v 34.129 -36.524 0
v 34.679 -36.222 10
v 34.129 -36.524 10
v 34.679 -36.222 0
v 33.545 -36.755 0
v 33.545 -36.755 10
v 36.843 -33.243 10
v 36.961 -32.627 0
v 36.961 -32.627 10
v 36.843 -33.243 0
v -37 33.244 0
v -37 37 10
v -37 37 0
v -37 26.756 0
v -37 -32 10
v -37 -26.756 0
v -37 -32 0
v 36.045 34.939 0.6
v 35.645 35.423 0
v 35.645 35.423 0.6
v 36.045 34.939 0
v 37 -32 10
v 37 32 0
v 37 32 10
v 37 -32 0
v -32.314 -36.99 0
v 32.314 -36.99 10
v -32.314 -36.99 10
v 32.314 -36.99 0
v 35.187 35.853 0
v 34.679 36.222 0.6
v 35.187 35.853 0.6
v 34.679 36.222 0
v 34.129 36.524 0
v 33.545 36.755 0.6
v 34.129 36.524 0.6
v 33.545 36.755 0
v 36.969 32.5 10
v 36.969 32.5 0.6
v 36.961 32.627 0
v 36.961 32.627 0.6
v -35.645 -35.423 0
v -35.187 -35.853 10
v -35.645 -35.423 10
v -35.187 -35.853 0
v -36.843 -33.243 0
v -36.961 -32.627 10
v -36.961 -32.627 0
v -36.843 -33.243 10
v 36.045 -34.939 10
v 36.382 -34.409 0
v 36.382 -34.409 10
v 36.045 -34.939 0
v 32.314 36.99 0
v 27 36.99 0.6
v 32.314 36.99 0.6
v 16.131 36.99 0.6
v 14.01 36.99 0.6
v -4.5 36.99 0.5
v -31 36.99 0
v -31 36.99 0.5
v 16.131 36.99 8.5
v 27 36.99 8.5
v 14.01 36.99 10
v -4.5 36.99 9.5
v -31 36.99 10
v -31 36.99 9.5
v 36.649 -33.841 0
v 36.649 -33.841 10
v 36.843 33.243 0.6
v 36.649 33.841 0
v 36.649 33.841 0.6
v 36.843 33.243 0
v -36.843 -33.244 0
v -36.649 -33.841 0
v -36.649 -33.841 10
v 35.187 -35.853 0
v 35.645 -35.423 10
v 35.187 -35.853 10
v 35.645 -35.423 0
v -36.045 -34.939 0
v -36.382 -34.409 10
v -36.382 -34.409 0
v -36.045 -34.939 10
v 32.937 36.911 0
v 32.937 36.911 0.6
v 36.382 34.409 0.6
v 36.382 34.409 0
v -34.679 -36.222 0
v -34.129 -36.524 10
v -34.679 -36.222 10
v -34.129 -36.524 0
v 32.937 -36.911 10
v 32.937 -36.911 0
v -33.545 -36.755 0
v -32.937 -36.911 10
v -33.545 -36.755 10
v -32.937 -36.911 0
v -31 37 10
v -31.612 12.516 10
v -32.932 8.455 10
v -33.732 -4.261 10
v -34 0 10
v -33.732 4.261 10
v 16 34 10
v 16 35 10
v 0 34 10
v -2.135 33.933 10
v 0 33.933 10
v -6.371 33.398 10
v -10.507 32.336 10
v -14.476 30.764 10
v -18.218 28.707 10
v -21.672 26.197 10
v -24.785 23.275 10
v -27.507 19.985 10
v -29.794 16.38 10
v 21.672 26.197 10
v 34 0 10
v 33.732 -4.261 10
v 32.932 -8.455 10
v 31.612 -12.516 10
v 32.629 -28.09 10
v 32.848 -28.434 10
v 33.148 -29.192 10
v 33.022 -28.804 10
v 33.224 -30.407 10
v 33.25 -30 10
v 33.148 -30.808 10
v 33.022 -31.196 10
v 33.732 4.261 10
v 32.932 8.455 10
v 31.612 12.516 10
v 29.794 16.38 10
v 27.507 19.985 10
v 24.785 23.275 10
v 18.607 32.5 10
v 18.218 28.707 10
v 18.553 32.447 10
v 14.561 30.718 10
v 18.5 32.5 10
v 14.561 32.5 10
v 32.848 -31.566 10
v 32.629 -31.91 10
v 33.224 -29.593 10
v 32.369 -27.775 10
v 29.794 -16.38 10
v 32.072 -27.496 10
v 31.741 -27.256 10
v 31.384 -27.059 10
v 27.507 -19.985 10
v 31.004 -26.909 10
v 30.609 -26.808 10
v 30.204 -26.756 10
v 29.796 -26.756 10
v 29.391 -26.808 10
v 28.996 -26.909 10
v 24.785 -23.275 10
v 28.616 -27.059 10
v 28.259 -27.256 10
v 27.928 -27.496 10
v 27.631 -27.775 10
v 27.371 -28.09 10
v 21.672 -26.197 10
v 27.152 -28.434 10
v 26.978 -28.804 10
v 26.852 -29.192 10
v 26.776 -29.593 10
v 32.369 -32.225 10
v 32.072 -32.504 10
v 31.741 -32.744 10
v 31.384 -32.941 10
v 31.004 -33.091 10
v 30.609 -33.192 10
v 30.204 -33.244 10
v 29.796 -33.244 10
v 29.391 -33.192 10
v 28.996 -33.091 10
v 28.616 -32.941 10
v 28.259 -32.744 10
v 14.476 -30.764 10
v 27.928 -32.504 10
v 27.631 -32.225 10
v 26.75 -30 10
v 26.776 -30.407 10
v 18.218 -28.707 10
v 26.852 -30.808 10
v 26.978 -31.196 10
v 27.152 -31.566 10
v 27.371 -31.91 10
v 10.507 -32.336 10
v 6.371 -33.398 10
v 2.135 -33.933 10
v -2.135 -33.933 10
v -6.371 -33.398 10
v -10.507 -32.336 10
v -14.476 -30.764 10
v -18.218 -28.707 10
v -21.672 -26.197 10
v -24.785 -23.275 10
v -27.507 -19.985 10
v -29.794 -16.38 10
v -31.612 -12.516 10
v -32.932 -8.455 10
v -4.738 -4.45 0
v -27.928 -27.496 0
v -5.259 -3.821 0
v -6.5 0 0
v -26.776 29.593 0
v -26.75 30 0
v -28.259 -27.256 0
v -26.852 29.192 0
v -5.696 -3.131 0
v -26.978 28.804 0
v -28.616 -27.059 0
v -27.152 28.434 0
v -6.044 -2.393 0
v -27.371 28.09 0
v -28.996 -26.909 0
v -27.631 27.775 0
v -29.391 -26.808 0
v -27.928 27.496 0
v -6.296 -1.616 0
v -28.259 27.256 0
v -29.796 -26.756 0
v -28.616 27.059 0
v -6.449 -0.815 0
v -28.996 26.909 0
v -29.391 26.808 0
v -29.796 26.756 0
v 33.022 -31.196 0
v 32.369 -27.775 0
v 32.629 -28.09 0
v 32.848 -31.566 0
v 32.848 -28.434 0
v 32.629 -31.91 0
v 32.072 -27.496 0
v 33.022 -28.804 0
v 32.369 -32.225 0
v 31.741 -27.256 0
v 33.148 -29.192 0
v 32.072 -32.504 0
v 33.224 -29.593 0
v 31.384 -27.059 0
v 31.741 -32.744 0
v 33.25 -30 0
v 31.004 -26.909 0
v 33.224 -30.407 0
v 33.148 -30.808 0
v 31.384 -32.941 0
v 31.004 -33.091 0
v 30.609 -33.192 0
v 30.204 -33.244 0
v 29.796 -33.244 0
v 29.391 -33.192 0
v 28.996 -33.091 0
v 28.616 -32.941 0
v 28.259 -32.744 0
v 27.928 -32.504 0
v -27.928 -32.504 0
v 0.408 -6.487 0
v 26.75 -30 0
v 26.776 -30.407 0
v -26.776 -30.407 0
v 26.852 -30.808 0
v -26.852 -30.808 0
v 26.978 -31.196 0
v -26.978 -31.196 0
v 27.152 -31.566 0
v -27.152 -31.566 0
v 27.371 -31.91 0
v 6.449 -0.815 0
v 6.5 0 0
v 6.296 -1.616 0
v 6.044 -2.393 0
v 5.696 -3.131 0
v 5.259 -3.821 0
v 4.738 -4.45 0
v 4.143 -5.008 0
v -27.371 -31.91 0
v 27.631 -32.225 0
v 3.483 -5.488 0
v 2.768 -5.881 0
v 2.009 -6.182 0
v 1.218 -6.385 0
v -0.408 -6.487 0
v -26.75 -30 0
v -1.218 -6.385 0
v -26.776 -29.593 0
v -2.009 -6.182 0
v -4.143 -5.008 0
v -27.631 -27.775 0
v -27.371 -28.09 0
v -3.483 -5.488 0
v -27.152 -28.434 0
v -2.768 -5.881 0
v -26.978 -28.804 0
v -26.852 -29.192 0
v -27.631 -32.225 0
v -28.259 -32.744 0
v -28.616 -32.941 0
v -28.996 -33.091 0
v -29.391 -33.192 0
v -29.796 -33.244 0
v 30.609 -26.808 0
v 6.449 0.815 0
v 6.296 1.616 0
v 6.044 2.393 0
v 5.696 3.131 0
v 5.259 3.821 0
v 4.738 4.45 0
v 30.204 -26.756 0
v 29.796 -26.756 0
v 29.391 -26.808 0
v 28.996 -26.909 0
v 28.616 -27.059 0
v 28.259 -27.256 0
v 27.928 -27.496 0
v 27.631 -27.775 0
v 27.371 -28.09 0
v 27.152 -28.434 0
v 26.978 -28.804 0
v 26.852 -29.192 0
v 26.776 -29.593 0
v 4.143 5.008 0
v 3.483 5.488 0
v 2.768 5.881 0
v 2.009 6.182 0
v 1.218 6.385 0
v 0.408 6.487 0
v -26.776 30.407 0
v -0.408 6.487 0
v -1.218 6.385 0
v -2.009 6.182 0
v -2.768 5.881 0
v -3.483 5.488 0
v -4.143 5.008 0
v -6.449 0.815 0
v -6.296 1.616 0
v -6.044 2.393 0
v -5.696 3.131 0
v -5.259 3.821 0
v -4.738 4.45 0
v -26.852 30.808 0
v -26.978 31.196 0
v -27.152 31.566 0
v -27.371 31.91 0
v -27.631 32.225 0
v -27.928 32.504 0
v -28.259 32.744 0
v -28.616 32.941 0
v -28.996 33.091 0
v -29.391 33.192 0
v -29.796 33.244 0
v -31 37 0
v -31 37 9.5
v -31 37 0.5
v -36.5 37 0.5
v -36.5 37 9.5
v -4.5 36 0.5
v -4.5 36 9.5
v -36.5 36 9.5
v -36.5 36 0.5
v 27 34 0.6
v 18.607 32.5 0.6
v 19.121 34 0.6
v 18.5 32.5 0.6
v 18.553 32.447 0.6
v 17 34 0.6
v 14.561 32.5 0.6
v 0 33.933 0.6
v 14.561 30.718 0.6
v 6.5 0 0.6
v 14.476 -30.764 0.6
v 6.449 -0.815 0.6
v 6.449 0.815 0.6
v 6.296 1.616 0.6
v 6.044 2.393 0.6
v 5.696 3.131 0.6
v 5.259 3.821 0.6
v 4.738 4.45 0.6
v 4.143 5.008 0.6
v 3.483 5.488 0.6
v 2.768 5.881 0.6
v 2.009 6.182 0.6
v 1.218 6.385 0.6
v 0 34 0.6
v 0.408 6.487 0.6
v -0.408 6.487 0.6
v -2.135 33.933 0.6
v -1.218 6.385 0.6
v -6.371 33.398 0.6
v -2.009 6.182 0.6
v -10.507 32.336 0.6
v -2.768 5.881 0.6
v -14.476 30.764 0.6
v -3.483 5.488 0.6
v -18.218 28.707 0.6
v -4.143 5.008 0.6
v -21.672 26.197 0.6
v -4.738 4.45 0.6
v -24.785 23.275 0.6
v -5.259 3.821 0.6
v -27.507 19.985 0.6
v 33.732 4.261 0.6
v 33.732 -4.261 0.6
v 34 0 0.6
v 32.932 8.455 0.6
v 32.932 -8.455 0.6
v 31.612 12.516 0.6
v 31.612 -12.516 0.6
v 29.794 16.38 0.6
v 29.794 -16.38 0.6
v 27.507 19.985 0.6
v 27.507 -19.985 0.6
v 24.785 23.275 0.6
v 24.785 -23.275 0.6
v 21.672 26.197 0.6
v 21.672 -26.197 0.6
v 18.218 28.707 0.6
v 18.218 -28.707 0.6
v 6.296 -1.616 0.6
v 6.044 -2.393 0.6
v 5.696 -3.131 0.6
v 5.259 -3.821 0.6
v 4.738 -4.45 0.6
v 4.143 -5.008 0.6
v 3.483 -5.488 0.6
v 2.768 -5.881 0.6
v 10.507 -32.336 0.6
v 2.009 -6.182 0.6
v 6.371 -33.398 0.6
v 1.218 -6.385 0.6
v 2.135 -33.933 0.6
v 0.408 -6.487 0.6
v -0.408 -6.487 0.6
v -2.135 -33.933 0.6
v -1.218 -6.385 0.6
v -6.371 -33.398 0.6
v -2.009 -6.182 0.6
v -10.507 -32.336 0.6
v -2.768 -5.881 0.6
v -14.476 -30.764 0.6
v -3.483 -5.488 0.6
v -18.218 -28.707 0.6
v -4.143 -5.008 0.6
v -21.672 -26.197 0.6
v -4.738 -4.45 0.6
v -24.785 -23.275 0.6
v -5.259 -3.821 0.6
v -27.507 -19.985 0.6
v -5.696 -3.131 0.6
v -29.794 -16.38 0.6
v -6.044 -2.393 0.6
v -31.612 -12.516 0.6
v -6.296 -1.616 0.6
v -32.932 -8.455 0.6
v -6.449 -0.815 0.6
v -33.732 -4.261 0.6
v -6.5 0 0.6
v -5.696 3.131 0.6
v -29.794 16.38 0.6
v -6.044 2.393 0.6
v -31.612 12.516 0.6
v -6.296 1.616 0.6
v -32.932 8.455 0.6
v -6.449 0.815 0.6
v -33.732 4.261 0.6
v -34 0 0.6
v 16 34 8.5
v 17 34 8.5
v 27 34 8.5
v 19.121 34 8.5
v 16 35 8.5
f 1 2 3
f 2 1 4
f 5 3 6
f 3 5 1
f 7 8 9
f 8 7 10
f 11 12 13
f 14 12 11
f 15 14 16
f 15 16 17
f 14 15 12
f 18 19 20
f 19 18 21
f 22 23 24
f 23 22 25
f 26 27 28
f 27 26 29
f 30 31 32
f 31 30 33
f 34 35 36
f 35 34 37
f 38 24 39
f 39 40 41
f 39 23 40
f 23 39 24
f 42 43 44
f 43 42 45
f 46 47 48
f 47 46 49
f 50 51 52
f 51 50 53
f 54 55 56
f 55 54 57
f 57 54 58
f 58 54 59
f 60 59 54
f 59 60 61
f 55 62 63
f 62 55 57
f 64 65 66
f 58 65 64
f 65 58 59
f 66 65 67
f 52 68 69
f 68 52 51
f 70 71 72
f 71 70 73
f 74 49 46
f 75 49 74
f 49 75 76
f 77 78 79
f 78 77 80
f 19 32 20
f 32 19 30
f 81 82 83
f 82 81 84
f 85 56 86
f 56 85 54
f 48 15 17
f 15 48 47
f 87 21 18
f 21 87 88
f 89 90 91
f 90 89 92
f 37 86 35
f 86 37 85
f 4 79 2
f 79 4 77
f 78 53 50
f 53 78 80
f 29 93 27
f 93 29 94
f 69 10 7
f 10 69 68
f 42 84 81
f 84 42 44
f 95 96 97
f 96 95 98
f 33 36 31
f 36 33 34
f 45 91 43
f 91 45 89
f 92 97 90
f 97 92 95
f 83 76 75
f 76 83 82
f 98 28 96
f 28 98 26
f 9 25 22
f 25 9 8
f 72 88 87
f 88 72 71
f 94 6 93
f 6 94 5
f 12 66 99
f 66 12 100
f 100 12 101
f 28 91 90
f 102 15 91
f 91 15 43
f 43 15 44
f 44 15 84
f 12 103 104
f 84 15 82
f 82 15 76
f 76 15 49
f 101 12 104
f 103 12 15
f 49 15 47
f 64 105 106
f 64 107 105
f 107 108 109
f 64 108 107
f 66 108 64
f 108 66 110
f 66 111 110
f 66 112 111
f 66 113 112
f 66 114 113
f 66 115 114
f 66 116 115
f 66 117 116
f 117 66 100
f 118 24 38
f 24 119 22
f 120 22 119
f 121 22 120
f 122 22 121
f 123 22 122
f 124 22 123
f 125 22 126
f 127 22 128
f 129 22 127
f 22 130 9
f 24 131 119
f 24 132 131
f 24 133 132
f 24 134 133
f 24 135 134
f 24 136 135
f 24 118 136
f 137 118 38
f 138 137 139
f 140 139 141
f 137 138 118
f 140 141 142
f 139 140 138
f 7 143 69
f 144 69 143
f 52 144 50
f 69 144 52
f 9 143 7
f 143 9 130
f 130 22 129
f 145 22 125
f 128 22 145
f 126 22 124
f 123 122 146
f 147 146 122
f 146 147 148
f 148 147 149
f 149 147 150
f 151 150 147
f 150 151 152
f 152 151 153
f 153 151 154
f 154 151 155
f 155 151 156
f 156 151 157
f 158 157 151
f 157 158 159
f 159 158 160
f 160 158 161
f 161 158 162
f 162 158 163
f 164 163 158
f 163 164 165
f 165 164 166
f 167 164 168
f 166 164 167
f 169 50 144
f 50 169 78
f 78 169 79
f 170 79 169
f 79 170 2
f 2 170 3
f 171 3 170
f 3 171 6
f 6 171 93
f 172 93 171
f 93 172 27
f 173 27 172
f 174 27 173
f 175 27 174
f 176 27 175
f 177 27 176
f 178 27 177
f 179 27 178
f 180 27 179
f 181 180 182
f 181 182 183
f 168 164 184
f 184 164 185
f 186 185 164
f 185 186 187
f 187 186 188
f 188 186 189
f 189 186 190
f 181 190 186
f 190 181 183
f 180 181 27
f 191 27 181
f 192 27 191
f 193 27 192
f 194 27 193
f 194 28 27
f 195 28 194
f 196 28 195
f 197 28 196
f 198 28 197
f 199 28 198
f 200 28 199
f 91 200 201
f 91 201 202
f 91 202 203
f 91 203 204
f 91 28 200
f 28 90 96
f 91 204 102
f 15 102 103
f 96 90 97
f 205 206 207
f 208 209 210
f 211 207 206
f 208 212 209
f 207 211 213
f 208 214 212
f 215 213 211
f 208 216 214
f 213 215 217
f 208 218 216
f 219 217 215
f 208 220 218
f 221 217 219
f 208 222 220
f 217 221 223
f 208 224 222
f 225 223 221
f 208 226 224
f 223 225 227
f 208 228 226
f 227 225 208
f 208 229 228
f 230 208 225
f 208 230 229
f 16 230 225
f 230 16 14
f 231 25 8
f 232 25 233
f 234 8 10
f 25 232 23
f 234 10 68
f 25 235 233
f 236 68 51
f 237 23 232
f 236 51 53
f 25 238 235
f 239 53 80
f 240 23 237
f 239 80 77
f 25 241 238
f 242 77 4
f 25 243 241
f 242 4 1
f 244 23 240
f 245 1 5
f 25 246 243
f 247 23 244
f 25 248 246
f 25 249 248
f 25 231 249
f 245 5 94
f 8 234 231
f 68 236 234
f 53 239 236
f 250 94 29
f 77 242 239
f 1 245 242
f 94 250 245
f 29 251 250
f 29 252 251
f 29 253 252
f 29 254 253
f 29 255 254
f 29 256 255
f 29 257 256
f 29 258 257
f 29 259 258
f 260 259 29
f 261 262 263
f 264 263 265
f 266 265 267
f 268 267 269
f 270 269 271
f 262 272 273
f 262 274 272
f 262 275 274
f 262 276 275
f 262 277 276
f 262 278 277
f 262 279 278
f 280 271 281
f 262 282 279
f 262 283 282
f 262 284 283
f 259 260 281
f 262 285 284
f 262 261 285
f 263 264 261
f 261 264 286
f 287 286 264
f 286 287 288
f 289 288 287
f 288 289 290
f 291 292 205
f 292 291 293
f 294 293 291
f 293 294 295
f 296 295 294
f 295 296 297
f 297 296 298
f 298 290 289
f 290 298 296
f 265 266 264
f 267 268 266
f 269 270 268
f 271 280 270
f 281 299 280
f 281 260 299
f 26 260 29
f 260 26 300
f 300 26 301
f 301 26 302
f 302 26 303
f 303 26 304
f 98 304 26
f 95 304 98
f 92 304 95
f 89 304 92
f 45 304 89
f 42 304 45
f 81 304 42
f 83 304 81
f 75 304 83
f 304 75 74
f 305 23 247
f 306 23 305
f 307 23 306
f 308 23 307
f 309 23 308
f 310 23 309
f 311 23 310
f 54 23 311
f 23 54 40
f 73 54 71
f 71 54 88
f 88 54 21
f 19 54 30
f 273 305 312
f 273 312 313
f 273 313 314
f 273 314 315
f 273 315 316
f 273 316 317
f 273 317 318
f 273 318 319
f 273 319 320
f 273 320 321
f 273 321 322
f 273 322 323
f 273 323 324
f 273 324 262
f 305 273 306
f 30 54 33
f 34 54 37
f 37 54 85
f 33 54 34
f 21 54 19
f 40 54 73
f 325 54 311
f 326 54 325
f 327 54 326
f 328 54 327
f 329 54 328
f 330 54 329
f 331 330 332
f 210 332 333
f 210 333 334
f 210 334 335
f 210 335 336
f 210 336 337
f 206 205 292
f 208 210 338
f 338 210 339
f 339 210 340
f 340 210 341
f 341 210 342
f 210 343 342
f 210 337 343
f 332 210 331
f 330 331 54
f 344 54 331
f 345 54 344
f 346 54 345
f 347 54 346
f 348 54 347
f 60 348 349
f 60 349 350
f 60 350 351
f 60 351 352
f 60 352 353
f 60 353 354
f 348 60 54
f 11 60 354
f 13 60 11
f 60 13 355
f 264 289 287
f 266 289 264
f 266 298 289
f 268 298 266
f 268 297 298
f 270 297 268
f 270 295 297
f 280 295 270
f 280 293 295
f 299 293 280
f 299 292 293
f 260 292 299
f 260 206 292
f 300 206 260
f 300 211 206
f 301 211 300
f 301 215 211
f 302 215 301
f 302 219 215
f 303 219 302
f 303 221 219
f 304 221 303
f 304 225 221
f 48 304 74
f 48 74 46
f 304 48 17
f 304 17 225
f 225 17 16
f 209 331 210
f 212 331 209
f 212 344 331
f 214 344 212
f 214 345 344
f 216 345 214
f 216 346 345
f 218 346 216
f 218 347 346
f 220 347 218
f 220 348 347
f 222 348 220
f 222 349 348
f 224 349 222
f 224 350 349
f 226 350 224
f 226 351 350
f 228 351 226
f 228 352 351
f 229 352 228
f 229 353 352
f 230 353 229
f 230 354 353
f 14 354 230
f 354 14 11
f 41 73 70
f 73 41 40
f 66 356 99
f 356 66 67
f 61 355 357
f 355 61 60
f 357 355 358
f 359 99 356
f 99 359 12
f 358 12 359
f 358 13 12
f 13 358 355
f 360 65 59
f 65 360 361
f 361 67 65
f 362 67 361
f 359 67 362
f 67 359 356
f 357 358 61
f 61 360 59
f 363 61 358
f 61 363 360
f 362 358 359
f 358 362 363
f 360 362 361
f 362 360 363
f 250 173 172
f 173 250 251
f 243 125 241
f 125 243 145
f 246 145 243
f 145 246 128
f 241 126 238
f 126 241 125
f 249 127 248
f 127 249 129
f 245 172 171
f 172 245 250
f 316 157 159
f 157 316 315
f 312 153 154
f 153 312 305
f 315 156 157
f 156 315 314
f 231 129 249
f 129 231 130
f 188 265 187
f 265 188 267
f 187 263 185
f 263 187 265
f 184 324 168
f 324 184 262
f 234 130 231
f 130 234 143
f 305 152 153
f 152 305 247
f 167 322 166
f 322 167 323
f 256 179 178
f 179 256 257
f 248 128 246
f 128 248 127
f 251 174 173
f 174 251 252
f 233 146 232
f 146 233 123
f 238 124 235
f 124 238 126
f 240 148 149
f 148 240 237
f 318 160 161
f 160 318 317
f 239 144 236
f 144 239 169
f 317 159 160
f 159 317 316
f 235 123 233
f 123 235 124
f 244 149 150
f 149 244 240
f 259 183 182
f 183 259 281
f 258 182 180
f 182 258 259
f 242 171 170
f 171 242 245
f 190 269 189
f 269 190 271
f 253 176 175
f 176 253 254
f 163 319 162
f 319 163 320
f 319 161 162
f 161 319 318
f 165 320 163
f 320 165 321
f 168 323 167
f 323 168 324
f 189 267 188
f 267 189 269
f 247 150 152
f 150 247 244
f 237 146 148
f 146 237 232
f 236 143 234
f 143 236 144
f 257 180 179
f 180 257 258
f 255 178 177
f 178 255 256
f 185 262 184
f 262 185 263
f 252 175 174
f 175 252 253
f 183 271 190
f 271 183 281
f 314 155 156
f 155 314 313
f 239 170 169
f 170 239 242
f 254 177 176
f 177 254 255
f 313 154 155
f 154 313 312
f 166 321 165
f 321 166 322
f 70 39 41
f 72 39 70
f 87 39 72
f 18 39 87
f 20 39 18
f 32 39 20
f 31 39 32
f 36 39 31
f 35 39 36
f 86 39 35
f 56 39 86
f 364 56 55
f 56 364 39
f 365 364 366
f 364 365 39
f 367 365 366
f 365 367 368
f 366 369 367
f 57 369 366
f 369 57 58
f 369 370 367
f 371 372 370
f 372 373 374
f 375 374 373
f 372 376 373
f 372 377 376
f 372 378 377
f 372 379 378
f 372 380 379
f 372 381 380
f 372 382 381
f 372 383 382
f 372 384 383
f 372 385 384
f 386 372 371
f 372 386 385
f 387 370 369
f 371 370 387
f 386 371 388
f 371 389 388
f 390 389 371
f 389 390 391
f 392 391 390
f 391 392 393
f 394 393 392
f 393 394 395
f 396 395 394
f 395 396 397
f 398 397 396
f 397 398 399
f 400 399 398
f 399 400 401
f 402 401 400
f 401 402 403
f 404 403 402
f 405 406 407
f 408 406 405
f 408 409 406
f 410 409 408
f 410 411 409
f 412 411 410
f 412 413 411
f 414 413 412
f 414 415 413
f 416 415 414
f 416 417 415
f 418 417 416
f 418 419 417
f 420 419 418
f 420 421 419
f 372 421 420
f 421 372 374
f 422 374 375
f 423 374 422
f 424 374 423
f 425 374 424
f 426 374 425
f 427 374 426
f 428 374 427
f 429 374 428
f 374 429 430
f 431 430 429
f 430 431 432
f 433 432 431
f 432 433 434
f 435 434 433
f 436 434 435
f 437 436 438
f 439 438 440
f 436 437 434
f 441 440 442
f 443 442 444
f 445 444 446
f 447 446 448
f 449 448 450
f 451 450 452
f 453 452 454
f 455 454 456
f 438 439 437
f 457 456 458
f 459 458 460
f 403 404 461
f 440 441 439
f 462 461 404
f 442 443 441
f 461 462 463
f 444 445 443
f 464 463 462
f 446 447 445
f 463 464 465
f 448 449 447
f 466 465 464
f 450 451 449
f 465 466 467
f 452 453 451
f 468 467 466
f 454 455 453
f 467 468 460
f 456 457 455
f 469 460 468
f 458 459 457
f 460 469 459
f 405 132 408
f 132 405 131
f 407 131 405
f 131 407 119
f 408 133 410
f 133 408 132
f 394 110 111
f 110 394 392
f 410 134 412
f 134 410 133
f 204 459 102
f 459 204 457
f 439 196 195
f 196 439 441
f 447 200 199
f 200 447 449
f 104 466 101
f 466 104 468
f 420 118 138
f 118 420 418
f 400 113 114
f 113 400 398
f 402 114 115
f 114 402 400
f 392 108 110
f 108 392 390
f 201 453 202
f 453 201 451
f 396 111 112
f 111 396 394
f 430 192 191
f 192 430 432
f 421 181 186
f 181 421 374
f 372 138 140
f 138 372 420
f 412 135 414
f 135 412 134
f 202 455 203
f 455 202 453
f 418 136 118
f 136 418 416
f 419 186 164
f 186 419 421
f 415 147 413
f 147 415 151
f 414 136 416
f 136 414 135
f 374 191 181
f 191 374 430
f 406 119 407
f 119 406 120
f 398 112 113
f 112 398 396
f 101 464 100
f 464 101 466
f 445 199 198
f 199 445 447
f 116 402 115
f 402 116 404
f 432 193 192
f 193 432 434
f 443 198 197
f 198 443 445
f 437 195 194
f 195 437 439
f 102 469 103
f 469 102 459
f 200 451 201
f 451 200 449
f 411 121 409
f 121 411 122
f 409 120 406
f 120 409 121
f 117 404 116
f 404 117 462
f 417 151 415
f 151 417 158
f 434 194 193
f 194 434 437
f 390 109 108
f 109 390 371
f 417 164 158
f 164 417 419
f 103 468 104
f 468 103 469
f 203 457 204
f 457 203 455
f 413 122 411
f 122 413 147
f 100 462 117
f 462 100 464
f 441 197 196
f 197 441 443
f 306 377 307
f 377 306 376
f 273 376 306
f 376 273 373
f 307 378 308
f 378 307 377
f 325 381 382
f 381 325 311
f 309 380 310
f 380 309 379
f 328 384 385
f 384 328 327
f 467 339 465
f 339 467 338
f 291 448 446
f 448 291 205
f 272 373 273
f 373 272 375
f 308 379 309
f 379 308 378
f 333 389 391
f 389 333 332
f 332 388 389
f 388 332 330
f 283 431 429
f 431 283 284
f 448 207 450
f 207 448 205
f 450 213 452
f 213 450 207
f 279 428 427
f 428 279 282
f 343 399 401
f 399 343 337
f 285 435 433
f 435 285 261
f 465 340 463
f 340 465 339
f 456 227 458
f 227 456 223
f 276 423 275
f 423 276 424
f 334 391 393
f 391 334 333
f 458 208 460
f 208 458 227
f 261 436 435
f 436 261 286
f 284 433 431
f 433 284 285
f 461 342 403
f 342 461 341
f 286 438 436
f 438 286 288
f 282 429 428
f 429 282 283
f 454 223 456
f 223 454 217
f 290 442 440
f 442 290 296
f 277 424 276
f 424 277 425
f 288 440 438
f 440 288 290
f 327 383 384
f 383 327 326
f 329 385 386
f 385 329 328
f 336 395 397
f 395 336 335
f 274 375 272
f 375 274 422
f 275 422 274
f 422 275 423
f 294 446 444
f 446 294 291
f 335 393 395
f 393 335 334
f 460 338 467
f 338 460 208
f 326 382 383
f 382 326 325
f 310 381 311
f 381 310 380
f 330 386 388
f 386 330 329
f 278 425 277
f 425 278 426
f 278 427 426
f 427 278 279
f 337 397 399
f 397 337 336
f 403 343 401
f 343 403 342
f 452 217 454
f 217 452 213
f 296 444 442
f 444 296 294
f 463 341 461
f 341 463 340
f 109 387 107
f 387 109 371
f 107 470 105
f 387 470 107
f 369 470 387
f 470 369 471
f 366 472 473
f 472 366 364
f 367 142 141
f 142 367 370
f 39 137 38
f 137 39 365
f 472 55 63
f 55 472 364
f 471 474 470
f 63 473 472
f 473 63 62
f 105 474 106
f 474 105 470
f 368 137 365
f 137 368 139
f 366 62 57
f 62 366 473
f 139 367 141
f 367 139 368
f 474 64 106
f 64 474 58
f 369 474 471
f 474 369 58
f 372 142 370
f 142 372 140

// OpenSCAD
$fn = 50;


difference() {
	union() {
		hull() {
			translate(v = [-32.0000000000, 32.0000000000, 0]) {
				cylinder(h = 10, r = 5);
			}
			translate(v = [32.0000000000, 32.0000000000, 0]) {
				cylinder(h = 10, r = 5);
			}
			translate(v = [-32.0000000000, -32.0000000000, 0]) {
				cylinder(h = 10, r = 5);
			}
			translate(v = [32.0000000000, -32.0000000000, 0]) {
				cylinder(h = 10, r = 5);
			}
		}
		translate(v = [-37.0000000000, 31.0000000000, 0]) {
			cube(size = [6, 6, 10]);
		}
	}
	union() {
		translate(v = [-37.5000000000, -30.0000000000, -250.0000000000]) {
			rotate(a = [0, 0, 0]) {
				difference() {
					union() {
						hull() {
							translate(v = [7.5000000000, 0, 0]) {
								cylinder(h = 250, r = 3.2500000000, r1 = 3.2500000000, r2 = 3.2500000000);
							}
							translate(v = [-7.5000000000, 0, 0]) {
								cylinder(h = 250, r = 3.2500000000, r1 = 3.2500000000, r2 = 3.2500000000);
							}
						}
					}
					union();
				}
			}
		}
		translate(v = [-37.5000000000, 30.0000000000, -250.0000000000]) {
			rotate(a = [0, 0, 0]) {
				difference() {
					union() {
						hull() {
							translate(v = [7.5000000000, 0, 0]) {
								cylinder(h = 250, r = 3.2500000000, r1 = 3.2500000000, r2 = 3.2500000000);
							}
							translate(v = [-7.5000000000, 0, 0]) {
								cylinder(h = 250, r = 3.2500000000, r1 = 3.2500000000, r2 = 3.2500000000);
							}
						}
					}
					union();
				}
			}
		}
		translate(v = [-36.5000000000, 36.0000000000, 0.5000000000]) {
			cube(size = [32, 1, 9.0000000000]);
		}
		translate(v = [30.0000000000, -30.0000000000, -50.0000000000]) {
			cylinder(h = 100, r = 3.2500000000);
		}
		translate(v = [0, 0, 0.6000000000]) {
			cylinder(h = 12.4000000000, r = 34.0000000000);
		}
		translate(v = [0, 0, -5.0000000000]) {
			cylinder(h = 10, r = 6.5000000000);
		}
		translate(v = [0.0000000000, 32.5000000000, 0.6000000000]) {
			cube(size = [37.0000000000, 1.5000000000, 12.4000000000]);
		}
		translate(v = [27.0000000000, 32.5000000000, 0.6000000000]) {
			cube(size = [10, 4.5000000000, 12.4000000000]);
		}
		translate(v = [16.0000000000, 32.5000000000, 8.5000000000]) {
			cube(size = [21, 4.5000000000, 1.5000000000]);
		}
		translate(v = [13.2500000000, 37.7500000000, 0.6000000000]) {
			rotate(a = [0, 0, -45]) {
				cube(size = [7.5000000000, 1.5000000000, 12.4000000000]);
			}
		}
		translate(v = [7.0610000000, 30.5000000000, 0.6000000000]) {
			cube(size = [7.5000000000, 2, 9.4000000000]);
		}
	}
}
